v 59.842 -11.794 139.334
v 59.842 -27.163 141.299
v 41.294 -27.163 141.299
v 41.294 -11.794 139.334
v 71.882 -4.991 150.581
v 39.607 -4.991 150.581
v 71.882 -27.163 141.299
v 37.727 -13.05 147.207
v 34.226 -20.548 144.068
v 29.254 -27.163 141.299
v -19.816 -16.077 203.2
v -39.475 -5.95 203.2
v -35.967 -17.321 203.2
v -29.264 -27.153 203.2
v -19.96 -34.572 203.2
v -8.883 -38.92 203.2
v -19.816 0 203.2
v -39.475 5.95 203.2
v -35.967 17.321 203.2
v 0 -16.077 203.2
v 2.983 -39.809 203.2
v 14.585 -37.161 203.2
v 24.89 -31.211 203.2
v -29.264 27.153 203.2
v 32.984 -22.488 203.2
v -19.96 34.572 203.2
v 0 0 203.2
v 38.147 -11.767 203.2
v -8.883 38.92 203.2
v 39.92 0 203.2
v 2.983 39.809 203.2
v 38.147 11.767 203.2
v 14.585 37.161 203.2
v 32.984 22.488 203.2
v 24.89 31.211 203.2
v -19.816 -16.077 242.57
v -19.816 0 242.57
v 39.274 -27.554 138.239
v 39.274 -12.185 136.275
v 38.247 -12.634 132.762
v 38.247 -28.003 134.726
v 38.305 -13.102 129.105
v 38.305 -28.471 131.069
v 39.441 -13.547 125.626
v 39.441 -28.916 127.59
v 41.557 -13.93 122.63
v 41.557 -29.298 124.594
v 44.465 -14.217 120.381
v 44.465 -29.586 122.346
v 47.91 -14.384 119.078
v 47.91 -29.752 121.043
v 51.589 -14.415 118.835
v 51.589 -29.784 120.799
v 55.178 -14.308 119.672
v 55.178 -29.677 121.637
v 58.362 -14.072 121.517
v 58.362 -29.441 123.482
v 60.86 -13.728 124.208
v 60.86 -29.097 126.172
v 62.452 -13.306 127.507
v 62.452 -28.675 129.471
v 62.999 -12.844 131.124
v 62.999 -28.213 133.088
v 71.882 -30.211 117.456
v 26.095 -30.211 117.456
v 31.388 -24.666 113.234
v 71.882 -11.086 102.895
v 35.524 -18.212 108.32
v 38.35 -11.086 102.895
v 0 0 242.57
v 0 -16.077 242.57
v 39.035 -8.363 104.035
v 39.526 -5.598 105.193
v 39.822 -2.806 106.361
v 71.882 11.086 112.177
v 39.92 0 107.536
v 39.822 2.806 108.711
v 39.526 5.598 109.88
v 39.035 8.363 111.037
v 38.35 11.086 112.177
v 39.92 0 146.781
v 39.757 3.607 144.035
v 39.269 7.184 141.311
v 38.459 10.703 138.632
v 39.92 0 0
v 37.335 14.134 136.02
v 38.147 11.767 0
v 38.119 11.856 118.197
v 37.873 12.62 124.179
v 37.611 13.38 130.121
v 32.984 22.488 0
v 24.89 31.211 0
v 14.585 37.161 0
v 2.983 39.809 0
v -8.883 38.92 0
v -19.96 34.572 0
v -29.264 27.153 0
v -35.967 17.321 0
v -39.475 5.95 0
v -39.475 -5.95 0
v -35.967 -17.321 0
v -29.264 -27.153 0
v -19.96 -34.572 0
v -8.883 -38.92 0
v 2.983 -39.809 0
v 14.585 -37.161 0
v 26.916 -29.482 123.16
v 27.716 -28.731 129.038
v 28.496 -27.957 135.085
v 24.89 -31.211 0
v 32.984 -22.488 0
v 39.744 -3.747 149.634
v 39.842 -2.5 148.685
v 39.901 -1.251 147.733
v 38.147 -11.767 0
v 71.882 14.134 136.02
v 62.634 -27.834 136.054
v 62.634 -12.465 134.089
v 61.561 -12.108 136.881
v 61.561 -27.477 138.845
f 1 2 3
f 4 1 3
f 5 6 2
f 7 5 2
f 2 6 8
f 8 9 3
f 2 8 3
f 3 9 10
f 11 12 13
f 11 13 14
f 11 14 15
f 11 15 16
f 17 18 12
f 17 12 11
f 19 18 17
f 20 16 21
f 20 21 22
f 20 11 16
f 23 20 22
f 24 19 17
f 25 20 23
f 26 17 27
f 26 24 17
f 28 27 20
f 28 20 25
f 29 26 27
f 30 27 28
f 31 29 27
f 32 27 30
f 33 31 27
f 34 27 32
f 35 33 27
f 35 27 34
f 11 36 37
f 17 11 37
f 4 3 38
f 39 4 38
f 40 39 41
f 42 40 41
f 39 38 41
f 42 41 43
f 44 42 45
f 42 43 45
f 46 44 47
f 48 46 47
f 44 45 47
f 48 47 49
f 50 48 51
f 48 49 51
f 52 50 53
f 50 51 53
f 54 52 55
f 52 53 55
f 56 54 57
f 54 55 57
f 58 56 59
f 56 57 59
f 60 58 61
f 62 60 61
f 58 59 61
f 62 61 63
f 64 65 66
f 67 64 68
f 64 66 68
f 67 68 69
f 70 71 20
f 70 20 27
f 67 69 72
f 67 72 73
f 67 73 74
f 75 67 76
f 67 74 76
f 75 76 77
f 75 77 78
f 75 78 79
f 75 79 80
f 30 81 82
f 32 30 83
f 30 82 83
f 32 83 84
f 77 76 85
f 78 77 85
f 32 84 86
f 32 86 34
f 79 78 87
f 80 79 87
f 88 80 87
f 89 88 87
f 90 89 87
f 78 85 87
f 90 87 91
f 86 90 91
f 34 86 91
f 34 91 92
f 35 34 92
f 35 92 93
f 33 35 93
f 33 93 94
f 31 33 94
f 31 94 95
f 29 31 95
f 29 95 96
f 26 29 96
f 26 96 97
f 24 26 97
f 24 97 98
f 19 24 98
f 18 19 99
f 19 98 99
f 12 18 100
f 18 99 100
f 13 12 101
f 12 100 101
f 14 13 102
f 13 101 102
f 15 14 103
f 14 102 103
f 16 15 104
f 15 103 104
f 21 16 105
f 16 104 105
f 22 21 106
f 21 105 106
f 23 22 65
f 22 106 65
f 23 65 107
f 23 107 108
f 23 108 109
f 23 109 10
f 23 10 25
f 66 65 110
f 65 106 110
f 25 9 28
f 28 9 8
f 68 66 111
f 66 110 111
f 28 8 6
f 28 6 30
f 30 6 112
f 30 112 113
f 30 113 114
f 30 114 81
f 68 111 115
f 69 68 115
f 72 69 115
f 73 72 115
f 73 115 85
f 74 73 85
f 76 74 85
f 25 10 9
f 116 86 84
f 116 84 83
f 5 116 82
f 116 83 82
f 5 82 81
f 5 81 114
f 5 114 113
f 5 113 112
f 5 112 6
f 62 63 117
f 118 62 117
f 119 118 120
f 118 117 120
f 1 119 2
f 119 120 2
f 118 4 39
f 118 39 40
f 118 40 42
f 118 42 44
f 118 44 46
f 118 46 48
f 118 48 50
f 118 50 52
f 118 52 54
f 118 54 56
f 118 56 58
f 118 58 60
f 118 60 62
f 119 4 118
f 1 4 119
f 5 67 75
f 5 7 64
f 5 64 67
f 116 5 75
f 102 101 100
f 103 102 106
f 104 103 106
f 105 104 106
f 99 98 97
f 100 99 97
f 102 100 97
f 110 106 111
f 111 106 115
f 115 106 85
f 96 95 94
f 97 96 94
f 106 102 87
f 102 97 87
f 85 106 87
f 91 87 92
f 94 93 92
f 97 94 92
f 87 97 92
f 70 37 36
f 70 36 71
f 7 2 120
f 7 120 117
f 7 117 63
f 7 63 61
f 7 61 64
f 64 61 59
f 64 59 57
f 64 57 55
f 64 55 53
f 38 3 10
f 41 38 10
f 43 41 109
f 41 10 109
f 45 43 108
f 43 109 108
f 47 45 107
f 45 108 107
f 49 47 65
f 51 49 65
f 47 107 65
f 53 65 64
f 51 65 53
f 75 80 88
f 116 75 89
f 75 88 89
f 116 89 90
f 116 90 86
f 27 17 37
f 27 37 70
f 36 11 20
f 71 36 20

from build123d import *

# Parameters (mm, degrees)
F0_R     = 39.9204473095
F1_DEPTH = 203.2
F2_W     = 19.8161117733
F2_H     = 16.0770136863
F3_DEPTH = 39.37
F5_DEPTH = 71.882
F7_DEPTH = 15.494


with BuildPart() as f1:
    # F0 (on Top) → F1 (new body)
    with BuildSketch(Plane.XY):
        Circle(F0_R)
    extrude(amount=F1_DEPTH)

    # F2 (on face) → F3 (join)
    with BuildSketch(Plane.XY.offset(203.2)):
        with Locations((-9.9080558866, -8.0385068431)):
            Rectangle(F2_W, F2_H)
    extrude(amount=F3_DEPTH)

    # F4 (on face) → F5 (join)
    with BuildSketch(Plane.YZ):
        Polygon((-11.0862118476, 102.8951700695), (11.0862118476, 112.177238249), (14.1339168521, 136.0201545224), (-4.9908018387, 150.5810026161), (-27.1632255339, 141.2989344366), (-30.2109305384, 117.4560181633), align=None)
    extrude(amount=F5_DEPTH)

    # F6 (on face) → F7 (cut)
    with BuildSketch(Plane(origin=(0, -44.4976190456, 5.6878787267), x_dir=(1, 0, 0), z_dir=(0, -0.9919292372, 0.1267926987))):
        with BuildLine():
            ThreePointArc((41.2940425882, 136.7144455761), (46.1384221296, 116.821871488), (62.9989352422, 128.4367591143))
            ThreePointArc((62.9989352422, 128.4367591143), (62.182928441, 132.8663777994), (59.8420390413, 136.7144455761))
            Line((59.8420390413, 136.7144455761), (41.2940425882, 136.7144455761))
        make_face()
    extrude(amount=-F7_DEPTH, mode=Mode.SUBTRACT)


solid = f1.part
